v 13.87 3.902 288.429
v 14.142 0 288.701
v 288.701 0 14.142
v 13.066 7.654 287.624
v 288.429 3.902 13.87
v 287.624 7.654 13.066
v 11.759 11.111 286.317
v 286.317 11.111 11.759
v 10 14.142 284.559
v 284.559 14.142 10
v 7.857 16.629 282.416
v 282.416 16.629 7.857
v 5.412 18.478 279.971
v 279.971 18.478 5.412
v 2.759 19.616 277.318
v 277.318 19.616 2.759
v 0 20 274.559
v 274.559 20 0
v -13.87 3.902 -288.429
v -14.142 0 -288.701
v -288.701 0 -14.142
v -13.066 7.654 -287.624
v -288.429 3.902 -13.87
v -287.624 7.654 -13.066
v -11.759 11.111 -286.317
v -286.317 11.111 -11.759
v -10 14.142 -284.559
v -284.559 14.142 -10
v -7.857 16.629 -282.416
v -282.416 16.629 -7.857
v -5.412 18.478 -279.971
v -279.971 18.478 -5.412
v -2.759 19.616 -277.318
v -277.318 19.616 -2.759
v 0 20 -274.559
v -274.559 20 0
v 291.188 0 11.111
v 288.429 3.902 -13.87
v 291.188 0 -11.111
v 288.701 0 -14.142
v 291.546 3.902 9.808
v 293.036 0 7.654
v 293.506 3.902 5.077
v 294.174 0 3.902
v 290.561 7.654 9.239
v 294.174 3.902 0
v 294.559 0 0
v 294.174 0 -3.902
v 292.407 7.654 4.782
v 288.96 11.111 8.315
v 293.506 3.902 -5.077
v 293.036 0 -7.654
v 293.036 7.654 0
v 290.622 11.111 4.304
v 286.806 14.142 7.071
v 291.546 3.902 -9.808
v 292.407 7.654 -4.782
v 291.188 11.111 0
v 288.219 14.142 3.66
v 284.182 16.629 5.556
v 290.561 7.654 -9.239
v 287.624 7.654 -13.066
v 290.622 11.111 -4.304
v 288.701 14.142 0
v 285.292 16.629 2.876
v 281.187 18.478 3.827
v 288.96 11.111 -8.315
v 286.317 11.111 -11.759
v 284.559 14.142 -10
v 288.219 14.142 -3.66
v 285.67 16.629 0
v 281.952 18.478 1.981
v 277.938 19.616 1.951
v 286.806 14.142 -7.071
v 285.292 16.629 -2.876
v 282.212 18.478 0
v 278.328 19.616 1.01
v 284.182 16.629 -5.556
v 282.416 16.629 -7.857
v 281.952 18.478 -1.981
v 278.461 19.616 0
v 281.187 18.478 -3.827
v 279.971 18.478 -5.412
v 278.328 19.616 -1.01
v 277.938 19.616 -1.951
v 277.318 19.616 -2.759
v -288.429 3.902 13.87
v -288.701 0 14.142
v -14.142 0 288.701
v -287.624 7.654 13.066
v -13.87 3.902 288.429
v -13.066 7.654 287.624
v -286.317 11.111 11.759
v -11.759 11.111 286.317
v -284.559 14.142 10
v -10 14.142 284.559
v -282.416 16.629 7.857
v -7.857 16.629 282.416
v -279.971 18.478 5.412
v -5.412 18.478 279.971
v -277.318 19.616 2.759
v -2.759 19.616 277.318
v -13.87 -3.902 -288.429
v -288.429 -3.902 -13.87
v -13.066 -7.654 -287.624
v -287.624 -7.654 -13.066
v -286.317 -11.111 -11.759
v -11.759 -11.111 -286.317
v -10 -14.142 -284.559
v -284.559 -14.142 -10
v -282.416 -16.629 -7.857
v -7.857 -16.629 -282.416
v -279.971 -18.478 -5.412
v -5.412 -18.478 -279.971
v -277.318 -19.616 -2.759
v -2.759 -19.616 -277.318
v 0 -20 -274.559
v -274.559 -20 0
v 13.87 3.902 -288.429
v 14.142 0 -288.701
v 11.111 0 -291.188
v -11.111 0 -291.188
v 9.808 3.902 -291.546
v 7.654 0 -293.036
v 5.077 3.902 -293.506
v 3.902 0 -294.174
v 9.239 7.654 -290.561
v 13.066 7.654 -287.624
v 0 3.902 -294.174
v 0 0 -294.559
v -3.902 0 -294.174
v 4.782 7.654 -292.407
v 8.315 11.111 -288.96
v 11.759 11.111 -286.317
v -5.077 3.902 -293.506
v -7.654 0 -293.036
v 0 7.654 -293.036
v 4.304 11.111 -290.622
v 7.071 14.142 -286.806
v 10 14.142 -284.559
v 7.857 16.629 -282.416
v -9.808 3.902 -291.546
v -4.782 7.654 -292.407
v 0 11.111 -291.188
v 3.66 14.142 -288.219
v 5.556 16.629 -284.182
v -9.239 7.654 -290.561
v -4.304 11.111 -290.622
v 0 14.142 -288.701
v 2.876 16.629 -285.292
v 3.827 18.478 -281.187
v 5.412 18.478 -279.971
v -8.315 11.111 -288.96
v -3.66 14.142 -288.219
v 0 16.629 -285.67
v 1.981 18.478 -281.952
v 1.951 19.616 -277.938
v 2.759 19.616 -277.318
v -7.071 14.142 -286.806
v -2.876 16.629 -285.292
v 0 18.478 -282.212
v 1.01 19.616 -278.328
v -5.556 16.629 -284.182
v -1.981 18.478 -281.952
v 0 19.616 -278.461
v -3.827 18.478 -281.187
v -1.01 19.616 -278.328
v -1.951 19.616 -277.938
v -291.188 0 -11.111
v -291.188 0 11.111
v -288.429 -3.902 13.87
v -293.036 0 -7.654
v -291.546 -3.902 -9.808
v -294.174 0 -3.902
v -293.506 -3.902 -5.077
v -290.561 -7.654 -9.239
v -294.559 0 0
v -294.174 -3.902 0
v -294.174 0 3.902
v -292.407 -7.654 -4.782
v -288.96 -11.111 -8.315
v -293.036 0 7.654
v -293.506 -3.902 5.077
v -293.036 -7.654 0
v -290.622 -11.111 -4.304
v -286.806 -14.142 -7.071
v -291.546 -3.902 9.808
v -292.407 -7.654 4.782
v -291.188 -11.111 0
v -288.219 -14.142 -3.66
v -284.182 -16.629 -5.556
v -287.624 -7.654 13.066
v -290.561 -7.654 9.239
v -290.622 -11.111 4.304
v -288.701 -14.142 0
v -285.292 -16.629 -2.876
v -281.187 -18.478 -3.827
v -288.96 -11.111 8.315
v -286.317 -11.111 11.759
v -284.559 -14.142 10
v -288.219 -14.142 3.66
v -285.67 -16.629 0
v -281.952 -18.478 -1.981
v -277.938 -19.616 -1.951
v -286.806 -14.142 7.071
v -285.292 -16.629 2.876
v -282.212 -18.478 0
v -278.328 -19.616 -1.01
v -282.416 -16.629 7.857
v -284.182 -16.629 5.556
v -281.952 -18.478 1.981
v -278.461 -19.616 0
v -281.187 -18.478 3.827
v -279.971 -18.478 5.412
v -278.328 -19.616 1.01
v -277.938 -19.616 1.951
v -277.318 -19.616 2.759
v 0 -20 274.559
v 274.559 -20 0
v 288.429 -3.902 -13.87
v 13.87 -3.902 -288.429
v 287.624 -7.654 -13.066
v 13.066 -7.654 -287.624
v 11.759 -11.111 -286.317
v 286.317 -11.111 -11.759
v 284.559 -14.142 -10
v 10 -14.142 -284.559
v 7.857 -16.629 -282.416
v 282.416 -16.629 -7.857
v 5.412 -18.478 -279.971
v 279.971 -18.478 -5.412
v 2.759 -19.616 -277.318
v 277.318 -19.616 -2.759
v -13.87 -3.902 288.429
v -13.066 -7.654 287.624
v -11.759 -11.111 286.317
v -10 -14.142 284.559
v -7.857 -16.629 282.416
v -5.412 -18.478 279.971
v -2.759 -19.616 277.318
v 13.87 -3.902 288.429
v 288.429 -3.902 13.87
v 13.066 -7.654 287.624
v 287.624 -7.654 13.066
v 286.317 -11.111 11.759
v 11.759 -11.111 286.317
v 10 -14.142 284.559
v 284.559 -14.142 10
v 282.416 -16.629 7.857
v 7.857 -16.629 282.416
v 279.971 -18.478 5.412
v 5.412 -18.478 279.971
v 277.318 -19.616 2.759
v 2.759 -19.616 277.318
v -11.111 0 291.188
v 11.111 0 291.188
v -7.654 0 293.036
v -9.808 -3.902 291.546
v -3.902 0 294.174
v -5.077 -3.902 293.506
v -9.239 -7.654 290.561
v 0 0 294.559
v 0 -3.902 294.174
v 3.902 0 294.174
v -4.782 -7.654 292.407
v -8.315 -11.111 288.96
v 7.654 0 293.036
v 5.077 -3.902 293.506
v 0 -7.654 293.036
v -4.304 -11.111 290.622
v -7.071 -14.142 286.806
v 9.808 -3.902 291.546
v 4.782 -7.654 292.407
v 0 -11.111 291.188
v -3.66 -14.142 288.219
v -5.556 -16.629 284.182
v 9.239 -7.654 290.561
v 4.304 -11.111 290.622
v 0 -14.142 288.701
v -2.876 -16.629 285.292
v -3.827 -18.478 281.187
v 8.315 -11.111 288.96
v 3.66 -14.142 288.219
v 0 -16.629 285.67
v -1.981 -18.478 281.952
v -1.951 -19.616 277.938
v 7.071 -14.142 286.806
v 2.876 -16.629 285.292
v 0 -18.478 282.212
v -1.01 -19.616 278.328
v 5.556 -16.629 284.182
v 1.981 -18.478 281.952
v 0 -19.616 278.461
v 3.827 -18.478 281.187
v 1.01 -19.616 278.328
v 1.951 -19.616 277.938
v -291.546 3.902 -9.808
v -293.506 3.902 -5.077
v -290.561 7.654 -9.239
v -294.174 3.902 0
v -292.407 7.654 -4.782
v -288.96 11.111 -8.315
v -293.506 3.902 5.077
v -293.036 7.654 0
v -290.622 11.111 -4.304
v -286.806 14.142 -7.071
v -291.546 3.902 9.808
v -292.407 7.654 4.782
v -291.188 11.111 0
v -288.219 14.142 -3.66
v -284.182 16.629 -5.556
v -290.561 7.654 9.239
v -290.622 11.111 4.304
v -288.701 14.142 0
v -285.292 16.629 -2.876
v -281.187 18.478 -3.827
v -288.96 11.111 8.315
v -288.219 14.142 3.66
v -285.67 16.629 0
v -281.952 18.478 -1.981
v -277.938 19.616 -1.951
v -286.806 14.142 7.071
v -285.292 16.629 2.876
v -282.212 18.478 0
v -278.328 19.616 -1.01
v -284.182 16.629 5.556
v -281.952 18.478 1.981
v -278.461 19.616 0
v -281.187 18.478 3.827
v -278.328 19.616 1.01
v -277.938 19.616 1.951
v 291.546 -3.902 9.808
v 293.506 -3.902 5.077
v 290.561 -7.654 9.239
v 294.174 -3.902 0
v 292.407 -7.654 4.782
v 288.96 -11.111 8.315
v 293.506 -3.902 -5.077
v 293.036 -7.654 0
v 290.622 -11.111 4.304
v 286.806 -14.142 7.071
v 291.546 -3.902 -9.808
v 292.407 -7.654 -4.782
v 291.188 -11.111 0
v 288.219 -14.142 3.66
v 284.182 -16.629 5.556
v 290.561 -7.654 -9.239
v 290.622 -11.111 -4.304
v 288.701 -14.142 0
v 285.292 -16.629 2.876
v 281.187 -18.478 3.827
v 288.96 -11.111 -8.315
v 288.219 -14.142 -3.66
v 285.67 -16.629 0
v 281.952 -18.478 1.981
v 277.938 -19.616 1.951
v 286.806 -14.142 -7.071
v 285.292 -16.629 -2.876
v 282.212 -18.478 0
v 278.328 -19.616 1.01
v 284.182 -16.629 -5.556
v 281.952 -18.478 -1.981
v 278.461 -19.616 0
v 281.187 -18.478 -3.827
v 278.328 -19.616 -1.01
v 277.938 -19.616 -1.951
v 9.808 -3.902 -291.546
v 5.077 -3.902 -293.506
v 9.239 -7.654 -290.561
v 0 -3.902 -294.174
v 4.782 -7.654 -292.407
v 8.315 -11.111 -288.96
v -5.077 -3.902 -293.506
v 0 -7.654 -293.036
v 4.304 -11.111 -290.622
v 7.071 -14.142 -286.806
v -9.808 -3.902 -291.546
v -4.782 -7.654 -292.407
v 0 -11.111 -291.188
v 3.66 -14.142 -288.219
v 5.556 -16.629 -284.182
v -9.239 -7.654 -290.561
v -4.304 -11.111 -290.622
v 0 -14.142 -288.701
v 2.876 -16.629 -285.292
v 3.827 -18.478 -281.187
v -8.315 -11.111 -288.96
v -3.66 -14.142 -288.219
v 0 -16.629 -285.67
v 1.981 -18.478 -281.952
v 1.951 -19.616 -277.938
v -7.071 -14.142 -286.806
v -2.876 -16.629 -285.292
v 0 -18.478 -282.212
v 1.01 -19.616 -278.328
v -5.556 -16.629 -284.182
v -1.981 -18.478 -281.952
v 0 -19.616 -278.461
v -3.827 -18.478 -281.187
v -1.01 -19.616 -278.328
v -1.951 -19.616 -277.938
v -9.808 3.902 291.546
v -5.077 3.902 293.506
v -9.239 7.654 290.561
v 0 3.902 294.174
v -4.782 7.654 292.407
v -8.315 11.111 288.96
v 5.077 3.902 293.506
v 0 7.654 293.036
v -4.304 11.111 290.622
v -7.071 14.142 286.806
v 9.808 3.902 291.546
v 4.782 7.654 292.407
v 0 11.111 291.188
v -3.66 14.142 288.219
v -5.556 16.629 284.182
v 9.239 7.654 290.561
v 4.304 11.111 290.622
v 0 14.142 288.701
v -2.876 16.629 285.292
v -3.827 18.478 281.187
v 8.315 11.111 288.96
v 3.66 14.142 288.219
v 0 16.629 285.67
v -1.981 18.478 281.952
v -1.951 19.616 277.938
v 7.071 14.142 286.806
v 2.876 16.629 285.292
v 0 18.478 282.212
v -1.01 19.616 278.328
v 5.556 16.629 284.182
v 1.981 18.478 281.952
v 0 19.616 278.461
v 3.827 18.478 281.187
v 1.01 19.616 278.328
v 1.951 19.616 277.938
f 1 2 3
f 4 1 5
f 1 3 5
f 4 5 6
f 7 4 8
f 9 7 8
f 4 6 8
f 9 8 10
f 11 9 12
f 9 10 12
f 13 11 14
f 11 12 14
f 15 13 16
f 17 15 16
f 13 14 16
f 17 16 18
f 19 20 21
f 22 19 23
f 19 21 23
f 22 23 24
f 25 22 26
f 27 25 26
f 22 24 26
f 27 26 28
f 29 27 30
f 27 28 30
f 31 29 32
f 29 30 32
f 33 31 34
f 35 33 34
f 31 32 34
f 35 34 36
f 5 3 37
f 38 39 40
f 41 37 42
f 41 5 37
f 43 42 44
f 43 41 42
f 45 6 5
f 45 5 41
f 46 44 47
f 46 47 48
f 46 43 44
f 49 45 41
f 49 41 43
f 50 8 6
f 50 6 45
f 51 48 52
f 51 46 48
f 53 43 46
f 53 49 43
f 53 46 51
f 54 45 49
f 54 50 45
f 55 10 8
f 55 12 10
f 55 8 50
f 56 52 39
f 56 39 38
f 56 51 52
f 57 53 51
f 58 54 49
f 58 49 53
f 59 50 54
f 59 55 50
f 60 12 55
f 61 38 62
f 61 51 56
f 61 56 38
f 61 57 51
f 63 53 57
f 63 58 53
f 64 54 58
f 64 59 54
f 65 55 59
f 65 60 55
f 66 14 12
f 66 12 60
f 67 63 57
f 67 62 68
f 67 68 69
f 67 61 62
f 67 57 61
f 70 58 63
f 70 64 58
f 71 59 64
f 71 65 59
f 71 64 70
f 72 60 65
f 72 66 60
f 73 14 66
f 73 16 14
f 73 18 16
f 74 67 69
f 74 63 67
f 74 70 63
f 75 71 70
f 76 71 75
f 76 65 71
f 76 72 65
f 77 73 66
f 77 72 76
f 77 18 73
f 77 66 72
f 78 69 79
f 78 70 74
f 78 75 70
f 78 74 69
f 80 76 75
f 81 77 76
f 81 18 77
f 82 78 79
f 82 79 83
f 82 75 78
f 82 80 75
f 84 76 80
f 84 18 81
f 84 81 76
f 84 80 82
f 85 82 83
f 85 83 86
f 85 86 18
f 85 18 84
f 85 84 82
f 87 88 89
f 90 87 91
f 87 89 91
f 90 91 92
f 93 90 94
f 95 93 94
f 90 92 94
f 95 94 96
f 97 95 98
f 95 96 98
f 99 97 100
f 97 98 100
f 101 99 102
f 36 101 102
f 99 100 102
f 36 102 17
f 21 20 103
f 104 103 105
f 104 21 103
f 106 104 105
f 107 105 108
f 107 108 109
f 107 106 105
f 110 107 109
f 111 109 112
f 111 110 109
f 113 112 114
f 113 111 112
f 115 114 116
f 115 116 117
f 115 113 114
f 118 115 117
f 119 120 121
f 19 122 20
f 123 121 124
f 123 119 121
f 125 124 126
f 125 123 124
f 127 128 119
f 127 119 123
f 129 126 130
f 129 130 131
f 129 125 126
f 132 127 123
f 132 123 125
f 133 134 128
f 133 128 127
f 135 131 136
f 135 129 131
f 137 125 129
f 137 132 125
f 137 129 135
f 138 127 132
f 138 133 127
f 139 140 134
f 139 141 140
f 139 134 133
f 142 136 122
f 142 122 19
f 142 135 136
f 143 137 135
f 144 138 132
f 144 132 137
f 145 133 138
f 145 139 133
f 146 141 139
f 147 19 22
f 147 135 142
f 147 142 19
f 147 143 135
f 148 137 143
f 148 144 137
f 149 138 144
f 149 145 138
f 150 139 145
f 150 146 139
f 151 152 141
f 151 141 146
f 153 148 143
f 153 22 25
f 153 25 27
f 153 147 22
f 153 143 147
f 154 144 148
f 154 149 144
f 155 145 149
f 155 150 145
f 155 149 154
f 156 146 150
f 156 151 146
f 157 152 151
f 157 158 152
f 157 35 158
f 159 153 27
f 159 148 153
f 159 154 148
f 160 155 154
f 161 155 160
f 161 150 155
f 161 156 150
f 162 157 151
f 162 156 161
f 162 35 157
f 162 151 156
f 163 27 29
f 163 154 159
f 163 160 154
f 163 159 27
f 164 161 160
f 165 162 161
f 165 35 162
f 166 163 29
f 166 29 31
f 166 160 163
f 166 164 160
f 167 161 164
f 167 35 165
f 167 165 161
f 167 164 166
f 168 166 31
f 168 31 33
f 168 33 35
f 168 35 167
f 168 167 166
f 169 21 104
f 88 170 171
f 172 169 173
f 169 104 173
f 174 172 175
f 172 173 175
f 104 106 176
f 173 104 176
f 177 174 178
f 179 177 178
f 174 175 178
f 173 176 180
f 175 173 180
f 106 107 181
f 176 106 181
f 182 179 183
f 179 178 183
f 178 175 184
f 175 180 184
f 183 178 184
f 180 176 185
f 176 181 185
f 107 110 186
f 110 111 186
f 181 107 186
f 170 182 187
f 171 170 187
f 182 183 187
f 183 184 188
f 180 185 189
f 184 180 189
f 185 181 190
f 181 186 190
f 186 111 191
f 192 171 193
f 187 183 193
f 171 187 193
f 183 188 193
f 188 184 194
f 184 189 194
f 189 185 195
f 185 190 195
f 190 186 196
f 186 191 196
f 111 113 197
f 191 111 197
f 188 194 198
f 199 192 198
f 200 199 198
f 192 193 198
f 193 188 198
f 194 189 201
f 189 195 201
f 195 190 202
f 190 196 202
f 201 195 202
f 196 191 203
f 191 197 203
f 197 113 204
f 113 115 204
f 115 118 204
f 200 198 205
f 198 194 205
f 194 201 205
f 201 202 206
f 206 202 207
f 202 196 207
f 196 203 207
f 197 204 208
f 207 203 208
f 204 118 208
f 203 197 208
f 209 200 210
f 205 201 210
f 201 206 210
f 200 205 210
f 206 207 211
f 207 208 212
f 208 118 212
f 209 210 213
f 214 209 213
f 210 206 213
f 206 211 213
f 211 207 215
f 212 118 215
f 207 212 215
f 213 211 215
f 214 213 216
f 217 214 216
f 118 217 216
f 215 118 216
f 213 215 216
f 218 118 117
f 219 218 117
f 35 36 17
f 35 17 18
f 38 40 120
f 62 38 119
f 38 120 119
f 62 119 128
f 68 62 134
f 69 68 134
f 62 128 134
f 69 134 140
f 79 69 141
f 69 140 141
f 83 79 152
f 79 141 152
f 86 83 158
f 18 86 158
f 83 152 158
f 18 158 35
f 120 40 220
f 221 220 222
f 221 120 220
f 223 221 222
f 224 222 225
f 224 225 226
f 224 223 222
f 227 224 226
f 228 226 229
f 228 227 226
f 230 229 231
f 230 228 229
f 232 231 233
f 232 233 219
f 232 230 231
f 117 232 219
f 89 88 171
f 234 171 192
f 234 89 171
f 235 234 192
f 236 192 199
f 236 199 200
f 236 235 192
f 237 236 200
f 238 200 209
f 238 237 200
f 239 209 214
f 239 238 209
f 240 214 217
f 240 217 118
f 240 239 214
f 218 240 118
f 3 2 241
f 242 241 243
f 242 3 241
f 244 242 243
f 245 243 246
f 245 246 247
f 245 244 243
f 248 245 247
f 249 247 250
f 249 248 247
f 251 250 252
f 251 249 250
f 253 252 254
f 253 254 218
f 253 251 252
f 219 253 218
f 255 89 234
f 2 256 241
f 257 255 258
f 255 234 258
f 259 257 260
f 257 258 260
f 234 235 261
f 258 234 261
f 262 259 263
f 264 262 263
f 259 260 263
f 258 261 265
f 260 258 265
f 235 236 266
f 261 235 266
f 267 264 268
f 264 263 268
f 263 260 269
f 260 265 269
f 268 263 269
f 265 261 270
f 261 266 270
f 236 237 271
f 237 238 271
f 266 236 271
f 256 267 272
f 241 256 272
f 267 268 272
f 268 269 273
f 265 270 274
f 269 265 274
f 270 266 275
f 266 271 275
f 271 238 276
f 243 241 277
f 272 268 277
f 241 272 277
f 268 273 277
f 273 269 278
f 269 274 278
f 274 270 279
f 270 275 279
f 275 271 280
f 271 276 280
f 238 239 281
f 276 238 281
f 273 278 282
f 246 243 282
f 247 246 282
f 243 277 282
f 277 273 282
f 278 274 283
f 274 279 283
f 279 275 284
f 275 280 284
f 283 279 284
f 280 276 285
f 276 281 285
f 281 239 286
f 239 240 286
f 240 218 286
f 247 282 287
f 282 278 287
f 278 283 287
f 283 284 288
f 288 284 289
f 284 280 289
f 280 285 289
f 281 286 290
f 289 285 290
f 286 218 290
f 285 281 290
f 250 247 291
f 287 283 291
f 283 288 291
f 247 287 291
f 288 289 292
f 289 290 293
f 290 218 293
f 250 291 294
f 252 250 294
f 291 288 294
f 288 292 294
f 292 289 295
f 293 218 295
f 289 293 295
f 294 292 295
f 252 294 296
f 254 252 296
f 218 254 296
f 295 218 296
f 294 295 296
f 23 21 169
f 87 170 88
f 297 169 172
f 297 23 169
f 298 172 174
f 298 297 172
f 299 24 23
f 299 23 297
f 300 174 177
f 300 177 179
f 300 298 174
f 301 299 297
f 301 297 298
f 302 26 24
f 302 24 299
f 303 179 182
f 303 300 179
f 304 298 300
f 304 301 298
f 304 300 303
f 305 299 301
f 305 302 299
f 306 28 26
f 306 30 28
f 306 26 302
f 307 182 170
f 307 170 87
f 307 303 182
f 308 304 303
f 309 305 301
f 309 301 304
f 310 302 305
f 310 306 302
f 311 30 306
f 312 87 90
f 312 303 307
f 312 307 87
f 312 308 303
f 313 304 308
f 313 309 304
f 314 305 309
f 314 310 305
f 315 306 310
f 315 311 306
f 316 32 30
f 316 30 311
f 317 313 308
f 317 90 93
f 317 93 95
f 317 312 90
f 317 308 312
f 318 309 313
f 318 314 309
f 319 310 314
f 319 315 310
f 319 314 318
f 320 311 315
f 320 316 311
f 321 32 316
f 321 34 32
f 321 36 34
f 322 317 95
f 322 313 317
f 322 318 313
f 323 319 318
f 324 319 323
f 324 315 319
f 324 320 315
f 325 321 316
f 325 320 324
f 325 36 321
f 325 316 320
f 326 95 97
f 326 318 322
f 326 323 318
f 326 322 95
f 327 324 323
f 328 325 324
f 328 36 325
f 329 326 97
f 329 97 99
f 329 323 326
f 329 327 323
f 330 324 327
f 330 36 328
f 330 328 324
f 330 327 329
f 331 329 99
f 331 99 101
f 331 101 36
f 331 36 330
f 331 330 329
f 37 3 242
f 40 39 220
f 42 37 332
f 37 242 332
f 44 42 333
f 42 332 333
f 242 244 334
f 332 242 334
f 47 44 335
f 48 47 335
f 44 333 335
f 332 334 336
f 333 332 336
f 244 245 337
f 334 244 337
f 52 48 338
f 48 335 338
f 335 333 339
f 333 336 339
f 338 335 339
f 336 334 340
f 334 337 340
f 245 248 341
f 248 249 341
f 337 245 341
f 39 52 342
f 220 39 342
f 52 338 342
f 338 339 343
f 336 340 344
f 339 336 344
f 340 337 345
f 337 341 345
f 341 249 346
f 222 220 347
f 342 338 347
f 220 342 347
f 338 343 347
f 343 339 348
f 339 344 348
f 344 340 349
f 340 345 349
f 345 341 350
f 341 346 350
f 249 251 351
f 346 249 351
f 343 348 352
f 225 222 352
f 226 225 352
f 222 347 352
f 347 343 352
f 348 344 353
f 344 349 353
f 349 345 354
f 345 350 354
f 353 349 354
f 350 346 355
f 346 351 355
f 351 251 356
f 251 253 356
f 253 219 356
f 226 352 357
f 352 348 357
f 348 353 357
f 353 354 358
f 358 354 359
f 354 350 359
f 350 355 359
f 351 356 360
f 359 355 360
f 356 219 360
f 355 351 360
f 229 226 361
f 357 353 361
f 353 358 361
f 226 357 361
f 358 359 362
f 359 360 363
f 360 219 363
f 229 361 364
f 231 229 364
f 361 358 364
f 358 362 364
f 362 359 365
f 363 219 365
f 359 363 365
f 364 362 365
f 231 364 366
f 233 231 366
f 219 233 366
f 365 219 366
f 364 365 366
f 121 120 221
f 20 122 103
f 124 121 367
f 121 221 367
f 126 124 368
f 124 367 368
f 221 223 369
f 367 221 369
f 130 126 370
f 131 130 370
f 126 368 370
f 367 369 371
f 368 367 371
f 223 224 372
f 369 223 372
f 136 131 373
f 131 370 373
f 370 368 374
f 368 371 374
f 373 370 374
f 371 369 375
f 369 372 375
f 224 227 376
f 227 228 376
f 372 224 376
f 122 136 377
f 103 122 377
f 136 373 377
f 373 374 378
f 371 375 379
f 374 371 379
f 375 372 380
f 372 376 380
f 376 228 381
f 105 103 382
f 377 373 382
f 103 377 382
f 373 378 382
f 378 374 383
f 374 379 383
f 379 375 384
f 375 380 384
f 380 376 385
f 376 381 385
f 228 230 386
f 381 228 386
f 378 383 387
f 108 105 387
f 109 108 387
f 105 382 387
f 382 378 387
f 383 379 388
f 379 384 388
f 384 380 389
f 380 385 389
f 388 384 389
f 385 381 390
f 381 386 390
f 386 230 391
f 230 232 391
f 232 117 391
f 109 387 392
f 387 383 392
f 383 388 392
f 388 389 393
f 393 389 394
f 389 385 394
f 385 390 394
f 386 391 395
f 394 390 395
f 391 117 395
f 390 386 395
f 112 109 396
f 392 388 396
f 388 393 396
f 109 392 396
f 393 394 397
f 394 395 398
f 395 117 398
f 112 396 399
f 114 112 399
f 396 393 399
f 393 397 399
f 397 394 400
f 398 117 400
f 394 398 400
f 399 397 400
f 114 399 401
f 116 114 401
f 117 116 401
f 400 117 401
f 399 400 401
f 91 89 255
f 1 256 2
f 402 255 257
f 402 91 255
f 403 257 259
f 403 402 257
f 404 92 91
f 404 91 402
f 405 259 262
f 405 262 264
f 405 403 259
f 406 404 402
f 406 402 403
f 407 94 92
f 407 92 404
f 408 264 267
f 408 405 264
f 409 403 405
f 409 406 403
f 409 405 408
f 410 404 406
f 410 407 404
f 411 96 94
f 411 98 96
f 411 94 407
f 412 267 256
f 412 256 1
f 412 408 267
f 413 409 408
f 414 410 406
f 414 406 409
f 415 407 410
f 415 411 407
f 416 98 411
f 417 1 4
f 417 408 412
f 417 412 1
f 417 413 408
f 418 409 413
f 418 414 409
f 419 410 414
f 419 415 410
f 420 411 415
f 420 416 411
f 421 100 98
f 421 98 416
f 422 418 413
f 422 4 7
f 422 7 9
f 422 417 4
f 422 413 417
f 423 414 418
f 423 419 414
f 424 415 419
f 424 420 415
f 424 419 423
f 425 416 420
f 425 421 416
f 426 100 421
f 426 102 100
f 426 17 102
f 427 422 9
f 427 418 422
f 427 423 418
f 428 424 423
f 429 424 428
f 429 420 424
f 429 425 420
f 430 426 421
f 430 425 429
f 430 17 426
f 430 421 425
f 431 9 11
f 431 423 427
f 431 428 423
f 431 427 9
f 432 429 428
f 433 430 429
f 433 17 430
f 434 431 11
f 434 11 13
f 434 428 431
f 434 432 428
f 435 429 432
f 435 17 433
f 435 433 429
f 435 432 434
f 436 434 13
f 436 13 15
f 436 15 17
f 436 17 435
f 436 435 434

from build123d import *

# Parameters (mm, degrees)
BOSS_EXTRUDE1_DEPTH      = 20
BOSS_EXTRUDE1_DEPTH_BACK = 20
FILLET1_R                = 20


with BuildPart() as part:
    # Sketch1 → Boss-Extrude1 (new, two sides: drawn at the far end of the back side and taken through both)
    with BuildSketch(Plane(origin=(0, 0, 0), x_dir=(1, 0, 0), z_dir=(0, 1, 0)).offset(-BOSS_EXTRUDE1_DEPTH_BACK)):
        with BuildLine():
            Line((-14.142135624, 288.700864376), (-288.700864376, 14.142135624))
            ThreePointArc((-288.700864376, 14.142135624), (-294.558728753, 0), (-288.700864376, -14.142135624))
            Line((-288.700864376, -14.142135624), (-14.142135624, -288.700864376))
            ThreePointArc((-14.142135624, -288.700864376), (0, -294.558728753), (14.142135624, -288.700864376))
            Line((14.142135624, -288.700864376), (288.700864376, -14.142135624))
            ThreePointArc((288.700864376, -14.142135624), (294.558728753, 0), (288.700864376, 14.142135624))
            Line((288.700864376, 14.142135624), (14.142135624, 288.700864376))
            ThreePointArc((14.142135624, 288.700864376), (0, 294.558728753), (-14.142135624, 288.700864376))
        make_face()
    extrude(amount=BOSS_EXTRUDE1_DEPTH + BOSS_EXTRUDE1_DEPTH_BACK)

    # Fillet1
    fillet1_edges = [part.edges().sort_by_distance(p)[0] for p in [
        (151.4215, -20, 151.4215),
        (0, -20, 294.558728753),
        (-151.4215, -20, 151.4215),
        (-294.558728753, -20, 0),
        (-151.4215, -20, -151.4215),
        (0, -20, -294.558728753),
        (151.4215, -20, -151.4215),
        (294.558728753, -20, 0),
        (151.4215, 20, 151.4215),
        (0, 20, 294.558728753),
        (-151.4215, 20, 151.4215),
        (-294.558728753, 20, 0),
        (-151.4215, 20, -151.4215),
        (0, 20, -294.558728753),
        (151.4215, 20, -151.4215),
        (294.558728753, 20, 0),
    ]]
    fillet(fillet1_edges, radius=FILLET1_R - 0.0001)  # a hair under: the kernel refuses the full size


solid = part.part
